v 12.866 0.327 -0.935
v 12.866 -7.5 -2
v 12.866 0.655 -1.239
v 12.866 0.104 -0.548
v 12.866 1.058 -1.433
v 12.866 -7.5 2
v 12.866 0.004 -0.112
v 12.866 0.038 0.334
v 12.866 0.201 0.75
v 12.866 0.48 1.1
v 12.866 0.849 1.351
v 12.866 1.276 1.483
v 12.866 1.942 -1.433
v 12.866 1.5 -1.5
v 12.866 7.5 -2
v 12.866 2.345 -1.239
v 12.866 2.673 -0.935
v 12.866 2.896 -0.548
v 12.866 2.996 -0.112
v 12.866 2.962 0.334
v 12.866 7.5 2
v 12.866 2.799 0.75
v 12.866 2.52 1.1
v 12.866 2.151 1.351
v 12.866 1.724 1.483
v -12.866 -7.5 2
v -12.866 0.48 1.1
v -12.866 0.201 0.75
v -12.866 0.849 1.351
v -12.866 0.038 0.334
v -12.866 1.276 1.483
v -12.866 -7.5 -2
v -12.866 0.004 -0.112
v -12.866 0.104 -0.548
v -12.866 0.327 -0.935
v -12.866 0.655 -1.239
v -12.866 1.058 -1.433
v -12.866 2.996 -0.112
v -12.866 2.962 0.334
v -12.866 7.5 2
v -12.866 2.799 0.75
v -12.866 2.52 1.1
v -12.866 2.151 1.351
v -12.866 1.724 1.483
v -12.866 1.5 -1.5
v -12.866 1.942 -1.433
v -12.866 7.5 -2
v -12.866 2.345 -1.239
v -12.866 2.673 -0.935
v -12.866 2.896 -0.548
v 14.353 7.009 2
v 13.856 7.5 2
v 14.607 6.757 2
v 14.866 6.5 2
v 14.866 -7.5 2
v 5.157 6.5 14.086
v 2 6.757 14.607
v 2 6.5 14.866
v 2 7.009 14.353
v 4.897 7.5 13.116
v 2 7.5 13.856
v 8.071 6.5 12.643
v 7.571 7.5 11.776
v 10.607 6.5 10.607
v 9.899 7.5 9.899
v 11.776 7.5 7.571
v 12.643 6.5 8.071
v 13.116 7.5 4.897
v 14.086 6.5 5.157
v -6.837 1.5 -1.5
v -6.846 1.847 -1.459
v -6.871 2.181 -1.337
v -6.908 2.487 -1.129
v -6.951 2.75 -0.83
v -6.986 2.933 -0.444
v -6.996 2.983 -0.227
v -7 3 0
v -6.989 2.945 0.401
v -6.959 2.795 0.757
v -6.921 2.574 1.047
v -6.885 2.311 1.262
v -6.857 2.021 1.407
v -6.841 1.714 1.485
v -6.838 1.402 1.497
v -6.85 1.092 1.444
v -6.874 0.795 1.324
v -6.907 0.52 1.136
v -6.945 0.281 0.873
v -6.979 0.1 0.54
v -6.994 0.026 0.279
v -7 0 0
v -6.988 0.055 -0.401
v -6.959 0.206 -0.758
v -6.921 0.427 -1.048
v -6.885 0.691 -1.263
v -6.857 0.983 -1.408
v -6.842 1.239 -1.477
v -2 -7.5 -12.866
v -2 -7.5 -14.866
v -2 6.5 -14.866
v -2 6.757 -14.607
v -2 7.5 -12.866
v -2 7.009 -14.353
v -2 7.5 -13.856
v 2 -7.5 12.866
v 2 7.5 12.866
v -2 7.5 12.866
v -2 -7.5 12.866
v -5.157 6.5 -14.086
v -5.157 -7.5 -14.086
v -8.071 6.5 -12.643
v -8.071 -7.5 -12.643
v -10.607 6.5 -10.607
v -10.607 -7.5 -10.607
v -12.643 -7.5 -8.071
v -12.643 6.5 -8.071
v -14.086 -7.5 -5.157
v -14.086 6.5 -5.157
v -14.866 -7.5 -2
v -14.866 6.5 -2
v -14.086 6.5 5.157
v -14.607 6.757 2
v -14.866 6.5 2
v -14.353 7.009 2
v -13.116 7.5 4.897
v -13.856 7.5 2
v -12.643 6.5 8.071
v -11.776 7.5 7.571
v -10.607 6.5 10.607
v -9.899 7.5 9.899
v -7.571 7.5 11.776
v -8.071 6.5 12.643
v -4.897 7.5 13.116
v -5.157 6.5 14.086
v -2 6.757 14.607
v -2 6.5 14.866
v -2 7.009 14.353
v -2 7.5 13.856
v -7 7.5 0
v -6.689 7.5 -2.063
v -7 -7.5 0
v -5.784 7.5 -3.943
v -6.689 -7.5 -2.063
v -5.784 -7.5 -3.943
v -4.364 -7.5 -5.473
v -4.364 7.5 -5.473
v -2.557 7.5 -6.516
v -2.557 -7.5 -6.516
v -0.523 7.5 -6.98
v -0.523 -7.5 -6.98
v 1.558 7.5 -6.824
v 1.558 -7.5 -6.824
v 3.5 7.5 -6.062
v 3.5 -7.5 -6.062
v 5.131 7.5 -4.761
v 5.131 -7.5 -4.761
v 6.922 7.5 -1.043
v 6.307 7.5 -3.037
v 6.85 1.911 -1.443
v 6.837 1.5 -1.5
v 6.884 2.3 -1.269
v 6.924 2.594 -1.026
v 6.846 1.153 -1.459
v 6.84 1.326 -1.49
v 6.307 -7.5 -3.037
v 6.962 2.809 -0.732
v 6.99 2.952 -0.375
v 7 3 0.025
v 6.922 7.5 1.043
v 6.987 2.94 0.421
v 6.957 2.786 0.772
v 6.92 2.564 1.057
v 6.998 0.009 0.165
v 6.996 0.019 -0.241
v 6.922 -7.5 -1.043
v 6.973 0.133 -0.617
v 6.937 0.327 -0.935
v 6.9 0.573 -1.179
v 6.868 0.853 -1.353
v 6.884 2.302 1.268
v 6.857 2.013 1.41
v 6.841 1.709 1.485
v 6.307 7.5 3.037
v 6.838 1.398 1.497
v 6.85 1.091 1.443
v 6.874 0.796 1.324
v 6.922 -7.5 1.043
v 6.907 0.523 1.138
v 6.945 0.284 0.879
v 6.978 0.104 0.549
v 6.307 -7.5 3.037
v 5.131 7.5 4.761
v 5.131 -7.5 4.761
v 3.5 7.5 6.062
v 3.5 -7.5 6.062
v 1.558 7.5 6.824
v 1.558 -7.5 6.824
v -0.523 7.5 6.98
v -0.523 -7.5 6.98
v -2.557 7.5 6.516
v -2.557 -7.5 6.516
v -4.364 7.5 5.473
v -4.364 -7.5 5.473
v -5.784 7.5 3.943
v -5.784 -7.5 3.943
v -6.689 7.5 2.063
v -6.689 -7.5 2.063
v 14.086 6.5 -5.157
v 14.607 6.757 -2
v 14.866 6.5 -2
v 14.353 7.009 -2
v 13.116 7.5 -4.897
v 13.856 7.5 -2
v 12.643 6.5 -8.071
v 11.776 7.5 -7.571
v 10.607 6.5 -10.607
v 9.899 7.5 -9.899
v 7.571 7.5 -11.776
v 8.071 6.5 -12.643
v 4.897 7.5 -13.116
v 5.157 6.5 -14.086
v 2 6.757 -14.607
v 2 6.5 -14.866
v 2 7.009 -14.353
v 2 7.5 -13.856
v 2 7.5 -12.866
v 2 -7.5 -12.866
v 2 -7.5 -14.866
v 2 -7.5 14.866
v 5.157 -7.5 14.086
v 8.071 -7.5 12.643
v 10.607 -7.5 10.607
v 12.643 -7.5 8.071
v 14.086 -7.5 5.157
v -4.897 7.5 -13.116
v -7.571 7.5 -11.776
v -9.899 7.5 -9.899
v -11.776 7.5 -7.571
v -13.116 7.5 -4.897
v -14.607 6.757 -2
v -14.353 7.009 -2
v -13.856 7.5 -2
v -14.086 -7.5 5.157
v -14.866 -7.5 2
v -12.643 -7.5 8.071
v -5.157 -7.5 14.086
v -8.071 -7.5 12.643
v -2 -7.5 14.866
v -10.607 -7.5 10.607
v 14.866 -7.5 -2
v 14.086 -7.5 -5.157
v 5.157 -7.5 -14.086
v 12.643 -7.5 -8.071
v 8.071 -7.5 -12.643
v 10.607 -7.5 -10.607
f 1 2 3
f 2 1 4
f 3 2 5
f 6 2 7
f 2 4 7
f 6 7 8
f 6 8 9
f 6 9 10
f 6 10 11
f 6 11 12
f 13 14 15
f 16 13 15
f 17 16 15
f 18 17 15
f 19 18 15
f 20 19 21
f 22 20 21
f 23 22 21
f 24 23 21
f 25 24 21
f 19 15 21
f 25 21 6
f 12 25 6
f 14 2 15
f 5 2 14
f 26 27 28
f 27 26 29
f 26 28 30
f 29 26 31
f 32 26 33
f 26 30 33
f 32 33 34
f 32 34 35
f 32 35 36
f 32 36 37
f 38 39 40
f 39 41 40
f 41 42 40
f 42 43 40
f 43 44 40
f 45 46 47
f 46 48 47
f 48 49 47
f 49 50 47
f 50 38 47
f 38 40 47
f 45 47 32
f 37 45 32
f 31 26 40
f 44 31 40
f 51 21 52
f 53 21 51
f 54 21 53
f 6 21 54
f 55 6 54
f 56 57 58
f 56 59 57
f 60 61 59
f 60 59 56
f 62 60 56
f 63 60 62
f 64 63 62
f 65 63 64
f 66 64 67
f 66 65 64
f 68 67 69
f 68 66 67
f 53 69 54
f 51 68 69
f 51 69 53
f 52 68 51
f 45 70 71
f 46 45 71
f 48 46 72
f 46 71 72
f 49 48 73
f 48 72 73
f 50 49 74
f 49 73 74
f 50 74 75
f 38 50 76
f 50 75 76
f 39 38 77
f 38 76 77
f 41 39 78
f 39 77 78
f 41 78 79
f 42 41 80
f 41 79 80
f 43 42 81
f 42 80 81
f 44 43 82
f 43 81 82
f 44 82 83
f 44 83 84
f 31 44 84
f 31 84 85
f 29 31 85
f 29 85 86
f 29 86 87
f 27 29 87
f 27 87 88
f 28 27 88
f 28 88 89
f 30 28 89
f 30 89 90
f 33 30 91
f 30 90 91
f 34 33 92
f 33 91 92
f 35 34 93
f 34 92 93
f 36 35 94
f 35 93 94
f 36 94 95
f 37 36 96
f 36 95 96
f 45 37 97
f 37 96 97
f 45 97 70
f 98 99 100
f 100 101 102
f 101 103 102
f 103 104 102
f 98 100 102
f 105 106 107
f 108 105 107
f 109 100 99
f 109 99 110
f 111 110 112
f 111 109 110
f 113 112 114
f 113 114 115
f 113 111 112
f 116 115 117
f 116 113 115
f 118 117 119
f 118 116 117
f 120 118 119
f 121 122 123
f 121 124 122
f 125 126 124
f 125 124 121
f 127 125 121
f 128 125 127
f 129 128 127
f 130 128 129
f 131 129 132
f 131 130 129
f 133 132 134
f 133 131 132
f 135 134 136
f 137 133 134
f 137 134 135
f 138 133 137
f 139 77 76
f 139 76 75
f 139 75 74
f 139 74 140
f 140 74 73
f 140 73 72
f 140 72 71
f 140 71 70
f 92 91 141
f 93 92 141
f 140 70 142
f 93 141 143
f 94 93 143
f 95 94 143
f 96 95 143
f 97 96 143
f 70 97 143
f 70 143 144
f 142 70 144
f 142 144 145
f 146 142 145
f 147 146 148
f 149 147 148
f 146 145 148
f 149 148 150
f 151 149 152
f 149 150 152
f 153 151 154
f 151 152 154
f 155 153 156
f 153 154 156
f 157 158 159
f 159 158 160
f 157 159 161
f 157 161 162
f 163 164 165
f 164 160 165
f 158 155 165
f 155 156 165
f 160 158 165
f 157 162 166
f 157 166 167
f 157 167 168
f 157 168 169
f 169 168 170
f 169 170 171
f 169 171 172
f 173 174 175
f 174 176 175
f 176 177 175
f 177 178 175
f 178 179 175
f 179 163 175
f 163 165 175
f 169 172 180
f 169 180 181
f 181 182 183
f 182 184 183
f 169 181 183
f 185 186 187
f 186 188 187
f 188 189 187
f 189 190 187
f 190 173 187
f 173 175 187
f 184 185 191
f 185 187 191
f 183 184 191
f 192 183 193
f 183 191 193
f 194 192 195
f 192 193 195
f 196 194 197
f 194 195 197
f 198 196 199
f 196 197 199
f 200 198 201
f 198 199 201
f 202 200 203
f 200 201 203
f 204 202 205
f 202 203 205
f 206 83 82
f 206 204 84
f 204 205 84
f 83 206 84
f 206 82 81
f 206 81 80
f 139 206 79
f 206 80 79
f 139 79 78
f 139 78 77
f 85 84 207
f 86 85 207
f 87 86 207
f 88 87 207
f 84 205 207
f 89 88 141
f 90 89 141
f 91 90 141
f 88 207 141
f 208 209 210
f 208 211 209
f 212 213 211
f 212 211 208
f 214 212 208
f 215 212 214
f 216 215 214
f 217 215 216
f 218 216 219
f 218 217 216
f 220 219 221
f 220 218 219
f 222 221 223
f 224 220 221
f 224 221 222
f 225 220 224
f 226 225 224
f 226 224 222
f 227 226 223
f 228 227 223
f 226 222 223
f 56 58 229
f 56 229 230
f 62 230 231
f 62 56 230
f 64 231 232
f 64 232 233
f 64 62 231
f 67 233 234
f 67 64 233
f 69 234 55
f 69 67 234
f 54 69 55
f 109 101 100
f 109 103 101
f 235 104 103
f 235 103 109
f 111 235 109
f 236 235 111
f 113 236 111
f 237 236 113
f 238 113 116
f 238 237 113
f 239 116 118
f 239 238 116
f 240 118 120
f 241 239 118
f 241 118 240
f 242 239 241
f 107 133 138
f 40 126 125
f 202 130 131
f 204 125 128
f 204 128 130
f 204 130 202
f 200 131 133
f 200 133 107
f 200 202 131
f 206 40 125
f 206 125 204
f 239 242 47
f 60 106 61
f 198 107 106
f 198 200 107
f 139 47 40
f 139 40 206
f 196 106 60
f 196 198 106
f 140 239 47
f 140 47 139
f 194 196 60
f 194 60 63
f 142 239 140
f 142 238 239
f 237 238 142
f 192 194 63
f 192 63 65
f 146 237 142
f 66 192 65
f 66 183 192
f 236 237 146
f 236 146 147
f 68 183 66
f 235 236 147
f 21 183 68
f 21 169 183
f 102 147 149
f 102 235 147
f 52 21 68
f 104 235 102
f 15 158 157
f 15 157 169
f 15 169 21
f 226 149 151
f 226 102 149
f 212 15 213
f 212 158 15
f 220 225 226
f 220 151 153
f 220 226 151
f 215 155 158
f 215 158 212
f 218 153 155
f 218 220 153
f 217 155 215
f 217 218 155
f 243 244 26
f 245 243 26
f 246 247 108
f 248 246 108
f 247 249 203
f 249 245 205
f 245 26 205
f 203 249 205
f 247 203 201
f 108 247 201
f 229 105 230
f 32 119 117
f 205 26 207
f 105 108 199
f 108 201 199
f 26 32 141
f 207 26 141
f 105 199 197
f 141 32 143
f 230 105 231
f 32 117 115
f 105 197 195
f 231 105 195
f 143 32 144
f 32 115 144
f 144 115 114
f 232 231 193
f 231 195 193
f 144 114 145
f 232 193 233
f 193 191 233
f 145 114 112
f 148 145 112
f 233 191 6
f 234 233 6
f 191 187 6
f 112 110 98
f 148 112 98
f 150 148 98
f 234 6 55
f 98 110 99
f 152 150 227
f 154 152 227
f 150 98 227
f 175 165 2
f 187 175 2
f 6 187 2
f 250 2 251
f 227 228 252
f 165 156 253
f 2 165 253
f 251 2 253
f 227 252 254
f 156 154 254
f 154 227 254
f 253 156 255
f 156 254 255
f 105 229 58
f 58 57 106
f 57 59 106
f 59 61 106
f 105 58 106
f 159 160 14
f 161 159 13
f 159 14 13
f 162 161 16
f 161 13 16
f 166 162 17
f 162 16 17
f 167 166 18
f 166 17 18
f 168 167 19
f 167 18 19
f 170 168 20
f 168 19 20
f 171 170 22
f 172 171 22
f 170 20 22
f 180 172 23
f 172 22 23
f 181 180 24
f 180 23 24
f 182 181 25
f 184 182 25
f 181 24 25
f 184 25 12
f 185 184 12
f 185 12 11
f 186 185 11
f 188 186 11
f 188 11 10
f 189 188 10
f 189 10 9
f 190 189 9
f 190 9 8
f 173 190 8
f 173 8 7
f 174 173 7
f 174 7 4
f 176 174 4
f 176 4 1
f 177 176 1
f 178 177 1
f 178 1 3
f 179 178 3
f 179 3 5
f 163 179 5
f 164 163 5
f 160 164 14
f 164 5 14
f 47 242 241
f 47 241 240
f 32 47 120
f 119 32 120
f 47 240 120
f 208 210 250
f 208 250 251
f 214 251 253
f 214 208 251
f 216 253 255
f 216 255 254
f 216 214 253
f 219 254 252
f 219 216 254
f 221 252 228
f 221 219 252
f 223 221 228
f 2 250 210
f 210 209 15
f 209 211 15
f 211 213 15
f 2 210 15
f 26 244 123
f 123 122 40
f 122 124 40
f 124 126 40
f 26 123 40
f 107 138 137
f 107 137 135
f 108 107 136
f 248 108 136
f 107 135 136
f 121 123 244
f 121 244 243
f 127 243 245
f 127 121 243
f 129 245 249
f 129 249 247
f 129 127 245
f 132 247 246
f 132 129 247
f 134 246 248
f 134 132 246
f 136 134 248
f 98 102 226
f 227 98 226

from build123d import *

# Parameters (mm, degrees)
SKETCH1_R               = 15
BOSS_EXTRUDE1_DEPTH     = 7.5
CUT_EXTRUDE1_DEPTH      = 8.5
CUT_EXTRUDE1_DEPTH_BACK = 8.5
CHAMFER1_SIZE           = 1
M16_TAPPED_HOLE1_D      = 14
M16_TAPPED_HOLE1_DEPTH  = 15
SKETCH5_R               = 1.5
CUT_EXTRUDE2_DEPTH      = 3
CUT_EXTRUDE2_DEPTH_BACK = 28.732137495


with BuildPart() as part:
    # Sketch1 → Boss-Extrude1 (new body, symmetric)
    with BuildSketch(Plane(origin=(0, 0, 0), x_dir=(1, 0, 0), z_dir=(0, 1, 0))):
        Circle(SKETCH1_R)
    extrude(amount=BOSS_EXTRUDE1_DEPTH, both=True)

    # Sketch2 → Cut-Extrude1 (cut, two sides)
    with BuildSketch(Plane(origin=(0, 0, 0), x_dir=(1, 0, 0), z_dir=(0, 1, 0))) as cut_extrude1_sk:
        with BuildLine():
            Line((-2, 14.866068747), (-2, 12.866068747))
            Line((-2, 12.866068747), (2, 12.866068747))
            Line((2, 12.866068747), (2, 14.866068747))
            ThreePointArc((2, 14.866068747), (0, 15), (-2, 14.866068747))
        make_face()
        with BuildLine():
            Line((14.866068747, 2), (12.866068747, 2))
            Line((12.866068747, 2), (12.866068747, -2))
            Line((12.866068747, -2), (14.866068747, -2))
            ThreePointArc((14.866068747, -2), (15, 0), (14.866068747, 2))
        make_face()
        with BuildLine():
            Line((2, -14.866068747), (2, -12.866068747))
            Line((2, -12.866068747), (-2, -12.866068747))
            Line((-2, -12.866068747), (-2, -14.866068747))
            ThreePointArc((-2, -14.866068747), (0, -15), (2, -14.866068747))
        make_face()
        with BuildLine():
            Line((-14.866068747, -2), (-12.866068747, -2))
            Line((-12.866068747, -2), (-12.866068747, 2))
            Line((-12.866068747, 2), (-14.866068747, 2))
            ThreePointArc((-14.866068747, 2), (-15, 0), (-14.866068747, -2))
        make_face()
    extrude(amount=CUT_EXTRUDE1_DEPTH, mode=Mode.SUBTRACT)
    extrude(cut_extrude1_sk.sketch, amount=-CUT_EXTRUDE1_DEPTH_BACK, mode=Mode.SUBTRACT)

    # Chamfer1
    chamfer1_edges = [part.edges().sort_by_distance(p)[0] for p in [
        (10.606601718, 7.5, -10.606601718),
        (-10.606601718, 7.5, -10.606601718),
        (-10.606601718, 7.5, 10.606601718),
        (10.606601718, 7.5, 10.606601718),
    ]]
    chamfer(chamfer1_edges, length=CHAMFER1_SIZE)

    # M16 Tapped Hole1
    with Locations(Plane(origin=(0, 7.5, 0), x_dir=(1, 0, 0), z_dir=(0, 1, 0))):
        with Locations((0, 0)):
            Hole(M16_TAPPED_HOLE1_D / 2, depth=M16_TAPPED_HOLE1_DEPTH)

    # Sketch5 → Cut-Extrude2 (cut, two sides)
    with BuildSketch(Plane(origin=(12.866068747, 0, 0), x_dir=(0, 0, -1), z_dir=(1, 0, 0))) as cut_extrude2_sk:
        with Locations((0, 1.5)):
            Circle(SKETCH5_R)
    extrude(amount=CUT_EXTRUDE2_DEPTH, mode=Mode.SUBTRACT)
    extrude(cut_extrude2_sk.sketch, amount=-CUT_EXTRUDE2_DEPTH_BACK, mode=Mode.SUBTRACT)


solid = part.part
